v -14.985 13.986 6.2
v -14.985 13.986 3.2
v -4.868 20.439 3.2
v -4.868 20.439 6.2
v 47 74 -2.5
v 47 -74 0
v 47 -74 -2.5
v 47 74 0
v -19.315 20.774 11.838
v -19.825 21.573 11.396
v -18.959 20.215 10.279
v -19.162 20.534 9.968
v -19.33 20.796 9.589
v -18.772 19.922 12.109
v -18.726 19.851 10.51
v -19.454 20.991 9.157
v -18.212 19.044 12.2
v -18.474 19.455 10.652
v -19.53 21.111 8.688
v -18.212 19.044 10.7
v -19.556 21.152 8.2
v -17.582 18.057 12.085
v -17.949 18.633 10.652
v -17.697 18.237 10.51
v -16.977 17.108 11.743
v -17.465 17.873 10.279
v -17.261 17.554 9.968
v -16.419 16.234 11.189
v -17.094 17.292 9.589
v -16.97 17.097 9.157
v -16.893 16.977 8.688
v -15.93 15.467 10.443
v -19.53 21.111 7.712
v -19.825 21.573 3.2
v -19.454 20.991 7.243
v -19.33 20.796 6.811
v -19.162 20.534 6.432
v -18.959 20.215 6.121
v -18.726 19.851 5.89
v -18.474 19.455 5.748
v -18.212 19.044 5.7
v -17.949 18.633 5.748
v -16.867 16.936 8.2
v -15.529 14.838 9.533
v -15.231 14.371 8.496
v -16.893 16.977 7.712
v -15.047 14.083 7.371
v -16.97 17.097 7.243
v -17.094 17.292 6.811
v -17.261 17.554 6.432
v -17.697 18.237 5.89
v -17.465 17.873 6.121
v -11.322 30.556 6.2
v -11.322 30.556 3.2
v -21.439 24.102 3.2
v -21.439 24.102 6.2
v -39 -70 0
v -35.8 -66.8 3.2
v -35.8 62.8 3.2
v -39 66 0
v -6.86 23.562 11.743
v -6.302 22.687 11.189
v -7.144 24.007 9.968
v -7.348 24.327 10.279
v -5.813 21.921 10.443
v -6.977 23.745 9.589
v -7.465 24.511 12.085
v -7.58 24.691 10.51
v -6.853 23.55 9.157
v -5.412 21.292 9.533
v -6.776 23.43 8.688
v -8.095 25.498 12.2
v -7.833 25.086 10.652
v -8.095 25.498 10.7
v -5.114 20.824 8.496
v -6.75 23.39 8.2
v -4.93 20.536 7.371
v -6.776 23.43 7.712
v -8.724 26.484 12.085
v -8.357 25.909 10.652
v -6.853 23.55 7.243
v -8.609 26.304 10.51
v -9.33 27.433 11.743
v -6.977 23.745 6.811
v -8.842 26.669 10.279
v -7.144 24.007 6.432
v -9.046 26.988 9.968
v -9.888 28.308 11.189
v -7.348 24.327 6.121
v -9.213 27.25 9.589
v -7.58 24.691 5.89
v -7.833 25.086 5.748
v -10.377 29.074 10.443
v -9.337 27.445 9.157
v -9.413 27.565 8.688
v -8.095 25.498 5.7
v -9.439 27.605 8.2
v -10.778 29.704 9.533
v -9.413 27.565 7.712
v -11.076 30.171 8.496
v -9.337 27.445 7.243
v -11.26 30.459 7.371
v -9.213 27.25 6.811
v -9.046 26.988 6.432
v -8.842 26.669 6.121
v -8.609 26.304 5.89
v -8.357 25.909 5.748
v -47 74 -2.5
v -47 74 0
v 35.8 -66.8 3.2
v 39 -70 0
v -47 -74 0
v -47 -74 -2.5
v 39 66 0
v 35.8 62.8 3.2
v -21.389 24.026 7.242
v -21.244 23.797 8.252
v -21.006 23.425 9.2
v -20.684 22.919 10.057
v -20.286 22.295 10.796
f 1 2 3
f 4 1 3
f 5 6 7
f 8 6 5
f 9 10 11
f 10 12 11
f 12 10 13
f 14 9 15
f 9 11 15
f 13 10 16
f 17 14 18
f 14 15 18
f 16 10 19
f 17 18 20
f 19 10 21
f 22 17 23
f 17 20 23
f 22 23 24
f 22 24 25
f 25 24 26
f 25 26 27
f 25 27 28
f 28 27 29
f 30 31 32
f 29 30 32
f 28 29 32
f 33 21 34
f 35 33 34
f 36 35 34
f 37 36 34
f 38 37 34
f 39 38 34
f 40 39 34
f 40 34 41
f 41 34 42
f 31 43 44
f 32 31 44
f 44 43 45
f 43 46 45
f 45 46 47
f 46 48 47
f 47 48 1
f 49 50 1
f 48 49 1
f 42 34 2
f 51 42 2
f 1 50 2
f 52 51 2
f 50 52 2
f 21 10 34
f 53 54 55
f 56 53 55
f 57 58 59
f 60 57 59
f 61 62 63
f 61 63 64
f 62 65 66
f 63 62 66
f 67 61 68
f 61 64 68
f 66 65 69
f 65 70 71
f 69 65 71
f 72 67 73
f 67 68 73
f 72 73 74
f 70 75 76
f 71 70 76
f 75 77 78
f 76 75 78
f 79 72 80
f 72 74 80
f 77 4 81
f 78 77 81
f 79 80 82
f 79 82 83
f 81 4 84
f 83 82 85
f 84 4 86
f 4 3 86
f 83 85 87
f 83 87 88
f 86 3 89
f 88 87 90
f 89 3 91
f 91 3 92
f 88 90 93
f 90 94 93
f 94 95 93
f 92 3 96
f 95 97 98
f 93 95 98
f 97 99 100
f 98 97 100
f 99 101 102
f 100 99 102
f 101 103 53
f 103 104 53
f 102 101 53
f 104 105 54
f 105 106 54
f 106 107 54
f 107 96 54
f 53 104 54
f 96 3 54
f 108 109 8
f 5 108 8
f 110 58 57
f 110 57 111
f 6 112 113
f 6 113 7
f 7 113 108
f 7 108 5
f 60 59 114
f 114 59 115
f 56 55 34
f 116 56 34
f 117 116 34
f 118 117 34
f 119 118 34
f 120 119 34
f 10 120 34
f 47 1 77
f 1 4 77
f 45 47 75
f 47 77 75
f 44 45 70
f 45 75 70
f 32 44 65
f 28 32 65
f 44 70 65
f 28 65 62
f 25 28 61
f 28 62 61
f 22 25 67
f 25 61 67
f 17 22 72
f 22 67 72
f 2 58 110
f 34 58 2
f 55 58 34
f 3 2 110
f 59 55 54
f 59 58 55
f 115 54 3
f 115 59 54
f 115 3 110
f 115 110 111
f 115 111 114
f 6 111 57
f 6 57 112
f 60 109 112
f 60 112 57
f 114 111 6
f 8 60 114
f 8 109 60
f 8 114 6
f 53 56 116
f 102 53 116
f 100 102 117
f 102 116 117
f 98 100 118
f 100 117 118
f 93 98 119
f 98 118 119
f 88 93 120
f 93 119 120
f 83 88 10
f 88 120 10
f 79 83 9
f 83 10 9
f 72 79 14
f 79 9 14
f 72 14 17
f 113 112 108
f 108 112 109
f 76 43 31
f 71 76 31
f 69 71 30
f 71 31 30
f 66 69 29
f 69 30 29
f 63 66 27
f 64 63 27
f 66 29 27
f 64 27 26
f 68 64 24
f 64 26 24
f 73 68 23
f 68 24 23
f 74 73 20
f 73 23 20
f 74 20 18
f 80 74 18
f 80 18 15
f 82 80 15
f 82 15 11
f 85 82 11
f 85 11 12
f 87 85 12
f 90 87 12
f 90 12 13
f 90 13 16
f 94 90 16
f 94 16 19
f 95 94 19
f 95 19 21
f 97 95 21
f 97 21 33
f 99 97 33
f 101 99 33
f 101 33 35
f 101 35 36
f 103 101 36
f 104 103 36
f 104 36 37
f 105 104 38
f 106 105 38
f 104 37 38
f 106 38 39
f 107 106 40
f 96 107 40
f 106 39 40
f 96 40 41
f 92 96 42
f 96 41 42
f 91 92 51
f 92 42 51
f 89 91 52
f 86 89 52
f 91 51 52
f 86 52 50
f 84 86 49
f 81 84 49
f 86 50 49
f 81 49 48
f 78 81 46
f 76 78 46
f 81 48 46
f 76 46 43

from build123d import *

# Parameters (mm, degrees)
F0_W     = 94
F0_H     = 148
F0_W_2   = 78
F0_H_2   = 136
F1_DEPTH = 2.5
F2_DEPTH = 3.2
F3_SIZE  = 3.19999
F6_DEPTH = 9
F7_R     = 5.99999
F8_R     = 2.5
F9_DEPTH = 12.1


# Not quite as in the source:
# - a fillet or chamfer is up to 0.001 mm smaller than in the source, because OpenCascade refuses the exact size


with BuildPart() as f1:
    # F0 (on Top) → F1 (new body)
    with BuildSketch(Plane.XY):
        Rectangle(F0_W, F0_H)
        with Locations((0, -2)):
            Rectangle(F0_W_2, F0_H_2, mode=Mode.SUBTRACT)
        with Locations((0, -2)):
            Rectangle(F0_W_2, F0_H_2)
    extrude(amount=-F1_DEPTH)

    # F0 (on Top) → F2 (join)
    with BuildSketch(Plane.XY):
        with Locations((0, -2)):
            Rectangle(F0_W_2, F0_H_2)
    extrude(amount=F2_DEPTH)

    # F3 (size 3.2 in the source; OpenCascade refuses exactly that, so slightly less here)
    f3_edges = [f1.edges().sort_by_distance(p)[0] for p in [
        (-39, -2, 3.2),
        (0, -70, 3.2),
        (39, -2, 3.2),
        (0, 66, 3.2),
    ]]
    chamfer(f3_edges, length=F3_SIZE)

    # F5 (on face) → F6 (join)
    with BuildSketch(Plane.XY.offset(3.2)):
        Polygon((-21.4385061716, 24.1024312943), (-19.825111455, 21.5732105668), (-14.9849273053, 13.9855483843), (-4.8680443952, 20.4391272506), (-11.3216232616, 30.5560101607), align=None)
    extrude(amount=F6_DEPTH)

    # F7 (radius 6 in the source; OpenCascade refuses exactly that, so slightly less here)
    f7_edges = [f1.edges().sort_by_distance(p)[0] for p in [
        (-9.926486, 17.212338, 12.2),
        (-16.380065, 27.329221, 12.2),
    ]]
    fillet(f7_edges, radius=F7_R)

    # F8 (on face) → F9 (cut)
    with BuildSketch(Plane(origin=(-4.3097861814, -2.749220809, 0), x_dir=(0.5377982389, -0.8430735758, 0), z_dir=(-0.8430735758, -0.5377982389, 0))):
        with Locations((-25.8497138006, 8.2)):
            Circle(F8_R)
    extrude(amount=-F9_DEPTH, mode=Mode.SUBTRACT)


solid = f1.part
